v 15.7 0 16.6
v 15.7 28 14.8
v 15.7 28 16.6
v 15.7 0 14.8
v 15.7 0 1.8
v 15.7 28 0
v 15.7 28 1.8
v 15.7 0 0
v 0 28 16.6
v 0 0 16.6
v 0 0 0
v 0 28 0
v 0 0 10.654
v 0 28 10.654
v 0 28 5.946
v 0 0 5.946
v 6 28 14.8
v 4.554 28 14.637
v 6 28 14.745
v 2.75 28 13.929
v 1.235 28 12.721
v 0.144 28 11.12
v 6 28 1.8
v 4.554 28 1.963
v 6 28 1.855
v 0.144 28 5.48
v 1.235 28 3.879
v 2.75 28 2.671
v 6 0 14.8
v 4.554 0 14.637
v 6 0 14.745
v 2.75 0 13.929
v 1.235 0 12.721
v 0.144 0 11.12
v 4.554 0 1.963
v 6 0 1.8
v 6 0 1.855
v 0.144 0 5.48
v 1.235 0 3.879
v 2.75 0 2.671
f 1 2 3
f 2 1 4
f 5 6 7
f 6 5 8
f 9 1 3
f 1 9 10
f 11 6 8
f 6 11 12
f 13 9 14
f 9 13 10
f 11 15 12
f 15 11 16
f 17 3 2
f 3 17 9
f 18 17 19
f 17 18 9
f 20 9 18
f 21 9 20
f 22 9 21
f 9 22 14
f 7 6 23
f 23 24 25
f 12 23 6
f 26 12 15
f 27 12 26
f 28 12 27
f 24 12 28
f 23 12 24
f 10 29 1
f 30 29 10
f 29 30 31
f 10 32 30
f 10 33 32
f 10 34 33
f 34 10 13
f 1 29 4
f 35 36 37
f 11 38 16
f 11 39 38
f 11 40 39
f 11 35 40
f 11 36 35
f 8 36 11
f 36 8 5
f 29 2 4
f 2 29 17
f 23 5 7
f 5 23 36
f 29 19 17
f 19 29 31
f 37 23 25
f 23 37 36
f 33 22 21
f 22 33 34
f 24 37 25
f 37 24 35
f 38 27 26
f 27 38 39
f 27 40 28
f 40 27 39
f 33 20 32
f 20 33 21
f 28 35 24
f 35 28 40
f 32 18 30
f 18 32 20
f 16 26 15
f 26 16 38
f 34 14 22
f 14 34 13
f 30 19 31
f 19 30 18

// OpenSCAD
//-- Parámetros a variar
freq = 2; // Frecuencia en GHz
d0 = 10;
dL = 80;
i = 10;

//-- Determinación de constantes
lambda = 299.792458/freq;
L = 0.4*lambda;
a = d0;
b = ln(dL/d0)/L;

//-- CONSTRUCCIÓN DEL FEED
grosor_feed = 1.8; // Ver en el diagrama, no queda claro
// Revisar. ¿El eje del cilindro debería coincidir con el cable coaxial? Supongo que no por el diagrama

//translate([-(6+2.3+7.4)/2,-28/2,-(13+grosor_feed)/2])

difference(){
  difference(){
    cube([6+2.3+7.4,28,13+2*grosor_feed]);
      
    translate([6,-1,grosor_feed])
    cube([7.4+2.3+2,28+2,13]);
  }
  
  translate([6,-1,grosor_feed+13/2])
  #rotate([-90,0,0])
  cylinder(r=13/2,h=28+2);
}
